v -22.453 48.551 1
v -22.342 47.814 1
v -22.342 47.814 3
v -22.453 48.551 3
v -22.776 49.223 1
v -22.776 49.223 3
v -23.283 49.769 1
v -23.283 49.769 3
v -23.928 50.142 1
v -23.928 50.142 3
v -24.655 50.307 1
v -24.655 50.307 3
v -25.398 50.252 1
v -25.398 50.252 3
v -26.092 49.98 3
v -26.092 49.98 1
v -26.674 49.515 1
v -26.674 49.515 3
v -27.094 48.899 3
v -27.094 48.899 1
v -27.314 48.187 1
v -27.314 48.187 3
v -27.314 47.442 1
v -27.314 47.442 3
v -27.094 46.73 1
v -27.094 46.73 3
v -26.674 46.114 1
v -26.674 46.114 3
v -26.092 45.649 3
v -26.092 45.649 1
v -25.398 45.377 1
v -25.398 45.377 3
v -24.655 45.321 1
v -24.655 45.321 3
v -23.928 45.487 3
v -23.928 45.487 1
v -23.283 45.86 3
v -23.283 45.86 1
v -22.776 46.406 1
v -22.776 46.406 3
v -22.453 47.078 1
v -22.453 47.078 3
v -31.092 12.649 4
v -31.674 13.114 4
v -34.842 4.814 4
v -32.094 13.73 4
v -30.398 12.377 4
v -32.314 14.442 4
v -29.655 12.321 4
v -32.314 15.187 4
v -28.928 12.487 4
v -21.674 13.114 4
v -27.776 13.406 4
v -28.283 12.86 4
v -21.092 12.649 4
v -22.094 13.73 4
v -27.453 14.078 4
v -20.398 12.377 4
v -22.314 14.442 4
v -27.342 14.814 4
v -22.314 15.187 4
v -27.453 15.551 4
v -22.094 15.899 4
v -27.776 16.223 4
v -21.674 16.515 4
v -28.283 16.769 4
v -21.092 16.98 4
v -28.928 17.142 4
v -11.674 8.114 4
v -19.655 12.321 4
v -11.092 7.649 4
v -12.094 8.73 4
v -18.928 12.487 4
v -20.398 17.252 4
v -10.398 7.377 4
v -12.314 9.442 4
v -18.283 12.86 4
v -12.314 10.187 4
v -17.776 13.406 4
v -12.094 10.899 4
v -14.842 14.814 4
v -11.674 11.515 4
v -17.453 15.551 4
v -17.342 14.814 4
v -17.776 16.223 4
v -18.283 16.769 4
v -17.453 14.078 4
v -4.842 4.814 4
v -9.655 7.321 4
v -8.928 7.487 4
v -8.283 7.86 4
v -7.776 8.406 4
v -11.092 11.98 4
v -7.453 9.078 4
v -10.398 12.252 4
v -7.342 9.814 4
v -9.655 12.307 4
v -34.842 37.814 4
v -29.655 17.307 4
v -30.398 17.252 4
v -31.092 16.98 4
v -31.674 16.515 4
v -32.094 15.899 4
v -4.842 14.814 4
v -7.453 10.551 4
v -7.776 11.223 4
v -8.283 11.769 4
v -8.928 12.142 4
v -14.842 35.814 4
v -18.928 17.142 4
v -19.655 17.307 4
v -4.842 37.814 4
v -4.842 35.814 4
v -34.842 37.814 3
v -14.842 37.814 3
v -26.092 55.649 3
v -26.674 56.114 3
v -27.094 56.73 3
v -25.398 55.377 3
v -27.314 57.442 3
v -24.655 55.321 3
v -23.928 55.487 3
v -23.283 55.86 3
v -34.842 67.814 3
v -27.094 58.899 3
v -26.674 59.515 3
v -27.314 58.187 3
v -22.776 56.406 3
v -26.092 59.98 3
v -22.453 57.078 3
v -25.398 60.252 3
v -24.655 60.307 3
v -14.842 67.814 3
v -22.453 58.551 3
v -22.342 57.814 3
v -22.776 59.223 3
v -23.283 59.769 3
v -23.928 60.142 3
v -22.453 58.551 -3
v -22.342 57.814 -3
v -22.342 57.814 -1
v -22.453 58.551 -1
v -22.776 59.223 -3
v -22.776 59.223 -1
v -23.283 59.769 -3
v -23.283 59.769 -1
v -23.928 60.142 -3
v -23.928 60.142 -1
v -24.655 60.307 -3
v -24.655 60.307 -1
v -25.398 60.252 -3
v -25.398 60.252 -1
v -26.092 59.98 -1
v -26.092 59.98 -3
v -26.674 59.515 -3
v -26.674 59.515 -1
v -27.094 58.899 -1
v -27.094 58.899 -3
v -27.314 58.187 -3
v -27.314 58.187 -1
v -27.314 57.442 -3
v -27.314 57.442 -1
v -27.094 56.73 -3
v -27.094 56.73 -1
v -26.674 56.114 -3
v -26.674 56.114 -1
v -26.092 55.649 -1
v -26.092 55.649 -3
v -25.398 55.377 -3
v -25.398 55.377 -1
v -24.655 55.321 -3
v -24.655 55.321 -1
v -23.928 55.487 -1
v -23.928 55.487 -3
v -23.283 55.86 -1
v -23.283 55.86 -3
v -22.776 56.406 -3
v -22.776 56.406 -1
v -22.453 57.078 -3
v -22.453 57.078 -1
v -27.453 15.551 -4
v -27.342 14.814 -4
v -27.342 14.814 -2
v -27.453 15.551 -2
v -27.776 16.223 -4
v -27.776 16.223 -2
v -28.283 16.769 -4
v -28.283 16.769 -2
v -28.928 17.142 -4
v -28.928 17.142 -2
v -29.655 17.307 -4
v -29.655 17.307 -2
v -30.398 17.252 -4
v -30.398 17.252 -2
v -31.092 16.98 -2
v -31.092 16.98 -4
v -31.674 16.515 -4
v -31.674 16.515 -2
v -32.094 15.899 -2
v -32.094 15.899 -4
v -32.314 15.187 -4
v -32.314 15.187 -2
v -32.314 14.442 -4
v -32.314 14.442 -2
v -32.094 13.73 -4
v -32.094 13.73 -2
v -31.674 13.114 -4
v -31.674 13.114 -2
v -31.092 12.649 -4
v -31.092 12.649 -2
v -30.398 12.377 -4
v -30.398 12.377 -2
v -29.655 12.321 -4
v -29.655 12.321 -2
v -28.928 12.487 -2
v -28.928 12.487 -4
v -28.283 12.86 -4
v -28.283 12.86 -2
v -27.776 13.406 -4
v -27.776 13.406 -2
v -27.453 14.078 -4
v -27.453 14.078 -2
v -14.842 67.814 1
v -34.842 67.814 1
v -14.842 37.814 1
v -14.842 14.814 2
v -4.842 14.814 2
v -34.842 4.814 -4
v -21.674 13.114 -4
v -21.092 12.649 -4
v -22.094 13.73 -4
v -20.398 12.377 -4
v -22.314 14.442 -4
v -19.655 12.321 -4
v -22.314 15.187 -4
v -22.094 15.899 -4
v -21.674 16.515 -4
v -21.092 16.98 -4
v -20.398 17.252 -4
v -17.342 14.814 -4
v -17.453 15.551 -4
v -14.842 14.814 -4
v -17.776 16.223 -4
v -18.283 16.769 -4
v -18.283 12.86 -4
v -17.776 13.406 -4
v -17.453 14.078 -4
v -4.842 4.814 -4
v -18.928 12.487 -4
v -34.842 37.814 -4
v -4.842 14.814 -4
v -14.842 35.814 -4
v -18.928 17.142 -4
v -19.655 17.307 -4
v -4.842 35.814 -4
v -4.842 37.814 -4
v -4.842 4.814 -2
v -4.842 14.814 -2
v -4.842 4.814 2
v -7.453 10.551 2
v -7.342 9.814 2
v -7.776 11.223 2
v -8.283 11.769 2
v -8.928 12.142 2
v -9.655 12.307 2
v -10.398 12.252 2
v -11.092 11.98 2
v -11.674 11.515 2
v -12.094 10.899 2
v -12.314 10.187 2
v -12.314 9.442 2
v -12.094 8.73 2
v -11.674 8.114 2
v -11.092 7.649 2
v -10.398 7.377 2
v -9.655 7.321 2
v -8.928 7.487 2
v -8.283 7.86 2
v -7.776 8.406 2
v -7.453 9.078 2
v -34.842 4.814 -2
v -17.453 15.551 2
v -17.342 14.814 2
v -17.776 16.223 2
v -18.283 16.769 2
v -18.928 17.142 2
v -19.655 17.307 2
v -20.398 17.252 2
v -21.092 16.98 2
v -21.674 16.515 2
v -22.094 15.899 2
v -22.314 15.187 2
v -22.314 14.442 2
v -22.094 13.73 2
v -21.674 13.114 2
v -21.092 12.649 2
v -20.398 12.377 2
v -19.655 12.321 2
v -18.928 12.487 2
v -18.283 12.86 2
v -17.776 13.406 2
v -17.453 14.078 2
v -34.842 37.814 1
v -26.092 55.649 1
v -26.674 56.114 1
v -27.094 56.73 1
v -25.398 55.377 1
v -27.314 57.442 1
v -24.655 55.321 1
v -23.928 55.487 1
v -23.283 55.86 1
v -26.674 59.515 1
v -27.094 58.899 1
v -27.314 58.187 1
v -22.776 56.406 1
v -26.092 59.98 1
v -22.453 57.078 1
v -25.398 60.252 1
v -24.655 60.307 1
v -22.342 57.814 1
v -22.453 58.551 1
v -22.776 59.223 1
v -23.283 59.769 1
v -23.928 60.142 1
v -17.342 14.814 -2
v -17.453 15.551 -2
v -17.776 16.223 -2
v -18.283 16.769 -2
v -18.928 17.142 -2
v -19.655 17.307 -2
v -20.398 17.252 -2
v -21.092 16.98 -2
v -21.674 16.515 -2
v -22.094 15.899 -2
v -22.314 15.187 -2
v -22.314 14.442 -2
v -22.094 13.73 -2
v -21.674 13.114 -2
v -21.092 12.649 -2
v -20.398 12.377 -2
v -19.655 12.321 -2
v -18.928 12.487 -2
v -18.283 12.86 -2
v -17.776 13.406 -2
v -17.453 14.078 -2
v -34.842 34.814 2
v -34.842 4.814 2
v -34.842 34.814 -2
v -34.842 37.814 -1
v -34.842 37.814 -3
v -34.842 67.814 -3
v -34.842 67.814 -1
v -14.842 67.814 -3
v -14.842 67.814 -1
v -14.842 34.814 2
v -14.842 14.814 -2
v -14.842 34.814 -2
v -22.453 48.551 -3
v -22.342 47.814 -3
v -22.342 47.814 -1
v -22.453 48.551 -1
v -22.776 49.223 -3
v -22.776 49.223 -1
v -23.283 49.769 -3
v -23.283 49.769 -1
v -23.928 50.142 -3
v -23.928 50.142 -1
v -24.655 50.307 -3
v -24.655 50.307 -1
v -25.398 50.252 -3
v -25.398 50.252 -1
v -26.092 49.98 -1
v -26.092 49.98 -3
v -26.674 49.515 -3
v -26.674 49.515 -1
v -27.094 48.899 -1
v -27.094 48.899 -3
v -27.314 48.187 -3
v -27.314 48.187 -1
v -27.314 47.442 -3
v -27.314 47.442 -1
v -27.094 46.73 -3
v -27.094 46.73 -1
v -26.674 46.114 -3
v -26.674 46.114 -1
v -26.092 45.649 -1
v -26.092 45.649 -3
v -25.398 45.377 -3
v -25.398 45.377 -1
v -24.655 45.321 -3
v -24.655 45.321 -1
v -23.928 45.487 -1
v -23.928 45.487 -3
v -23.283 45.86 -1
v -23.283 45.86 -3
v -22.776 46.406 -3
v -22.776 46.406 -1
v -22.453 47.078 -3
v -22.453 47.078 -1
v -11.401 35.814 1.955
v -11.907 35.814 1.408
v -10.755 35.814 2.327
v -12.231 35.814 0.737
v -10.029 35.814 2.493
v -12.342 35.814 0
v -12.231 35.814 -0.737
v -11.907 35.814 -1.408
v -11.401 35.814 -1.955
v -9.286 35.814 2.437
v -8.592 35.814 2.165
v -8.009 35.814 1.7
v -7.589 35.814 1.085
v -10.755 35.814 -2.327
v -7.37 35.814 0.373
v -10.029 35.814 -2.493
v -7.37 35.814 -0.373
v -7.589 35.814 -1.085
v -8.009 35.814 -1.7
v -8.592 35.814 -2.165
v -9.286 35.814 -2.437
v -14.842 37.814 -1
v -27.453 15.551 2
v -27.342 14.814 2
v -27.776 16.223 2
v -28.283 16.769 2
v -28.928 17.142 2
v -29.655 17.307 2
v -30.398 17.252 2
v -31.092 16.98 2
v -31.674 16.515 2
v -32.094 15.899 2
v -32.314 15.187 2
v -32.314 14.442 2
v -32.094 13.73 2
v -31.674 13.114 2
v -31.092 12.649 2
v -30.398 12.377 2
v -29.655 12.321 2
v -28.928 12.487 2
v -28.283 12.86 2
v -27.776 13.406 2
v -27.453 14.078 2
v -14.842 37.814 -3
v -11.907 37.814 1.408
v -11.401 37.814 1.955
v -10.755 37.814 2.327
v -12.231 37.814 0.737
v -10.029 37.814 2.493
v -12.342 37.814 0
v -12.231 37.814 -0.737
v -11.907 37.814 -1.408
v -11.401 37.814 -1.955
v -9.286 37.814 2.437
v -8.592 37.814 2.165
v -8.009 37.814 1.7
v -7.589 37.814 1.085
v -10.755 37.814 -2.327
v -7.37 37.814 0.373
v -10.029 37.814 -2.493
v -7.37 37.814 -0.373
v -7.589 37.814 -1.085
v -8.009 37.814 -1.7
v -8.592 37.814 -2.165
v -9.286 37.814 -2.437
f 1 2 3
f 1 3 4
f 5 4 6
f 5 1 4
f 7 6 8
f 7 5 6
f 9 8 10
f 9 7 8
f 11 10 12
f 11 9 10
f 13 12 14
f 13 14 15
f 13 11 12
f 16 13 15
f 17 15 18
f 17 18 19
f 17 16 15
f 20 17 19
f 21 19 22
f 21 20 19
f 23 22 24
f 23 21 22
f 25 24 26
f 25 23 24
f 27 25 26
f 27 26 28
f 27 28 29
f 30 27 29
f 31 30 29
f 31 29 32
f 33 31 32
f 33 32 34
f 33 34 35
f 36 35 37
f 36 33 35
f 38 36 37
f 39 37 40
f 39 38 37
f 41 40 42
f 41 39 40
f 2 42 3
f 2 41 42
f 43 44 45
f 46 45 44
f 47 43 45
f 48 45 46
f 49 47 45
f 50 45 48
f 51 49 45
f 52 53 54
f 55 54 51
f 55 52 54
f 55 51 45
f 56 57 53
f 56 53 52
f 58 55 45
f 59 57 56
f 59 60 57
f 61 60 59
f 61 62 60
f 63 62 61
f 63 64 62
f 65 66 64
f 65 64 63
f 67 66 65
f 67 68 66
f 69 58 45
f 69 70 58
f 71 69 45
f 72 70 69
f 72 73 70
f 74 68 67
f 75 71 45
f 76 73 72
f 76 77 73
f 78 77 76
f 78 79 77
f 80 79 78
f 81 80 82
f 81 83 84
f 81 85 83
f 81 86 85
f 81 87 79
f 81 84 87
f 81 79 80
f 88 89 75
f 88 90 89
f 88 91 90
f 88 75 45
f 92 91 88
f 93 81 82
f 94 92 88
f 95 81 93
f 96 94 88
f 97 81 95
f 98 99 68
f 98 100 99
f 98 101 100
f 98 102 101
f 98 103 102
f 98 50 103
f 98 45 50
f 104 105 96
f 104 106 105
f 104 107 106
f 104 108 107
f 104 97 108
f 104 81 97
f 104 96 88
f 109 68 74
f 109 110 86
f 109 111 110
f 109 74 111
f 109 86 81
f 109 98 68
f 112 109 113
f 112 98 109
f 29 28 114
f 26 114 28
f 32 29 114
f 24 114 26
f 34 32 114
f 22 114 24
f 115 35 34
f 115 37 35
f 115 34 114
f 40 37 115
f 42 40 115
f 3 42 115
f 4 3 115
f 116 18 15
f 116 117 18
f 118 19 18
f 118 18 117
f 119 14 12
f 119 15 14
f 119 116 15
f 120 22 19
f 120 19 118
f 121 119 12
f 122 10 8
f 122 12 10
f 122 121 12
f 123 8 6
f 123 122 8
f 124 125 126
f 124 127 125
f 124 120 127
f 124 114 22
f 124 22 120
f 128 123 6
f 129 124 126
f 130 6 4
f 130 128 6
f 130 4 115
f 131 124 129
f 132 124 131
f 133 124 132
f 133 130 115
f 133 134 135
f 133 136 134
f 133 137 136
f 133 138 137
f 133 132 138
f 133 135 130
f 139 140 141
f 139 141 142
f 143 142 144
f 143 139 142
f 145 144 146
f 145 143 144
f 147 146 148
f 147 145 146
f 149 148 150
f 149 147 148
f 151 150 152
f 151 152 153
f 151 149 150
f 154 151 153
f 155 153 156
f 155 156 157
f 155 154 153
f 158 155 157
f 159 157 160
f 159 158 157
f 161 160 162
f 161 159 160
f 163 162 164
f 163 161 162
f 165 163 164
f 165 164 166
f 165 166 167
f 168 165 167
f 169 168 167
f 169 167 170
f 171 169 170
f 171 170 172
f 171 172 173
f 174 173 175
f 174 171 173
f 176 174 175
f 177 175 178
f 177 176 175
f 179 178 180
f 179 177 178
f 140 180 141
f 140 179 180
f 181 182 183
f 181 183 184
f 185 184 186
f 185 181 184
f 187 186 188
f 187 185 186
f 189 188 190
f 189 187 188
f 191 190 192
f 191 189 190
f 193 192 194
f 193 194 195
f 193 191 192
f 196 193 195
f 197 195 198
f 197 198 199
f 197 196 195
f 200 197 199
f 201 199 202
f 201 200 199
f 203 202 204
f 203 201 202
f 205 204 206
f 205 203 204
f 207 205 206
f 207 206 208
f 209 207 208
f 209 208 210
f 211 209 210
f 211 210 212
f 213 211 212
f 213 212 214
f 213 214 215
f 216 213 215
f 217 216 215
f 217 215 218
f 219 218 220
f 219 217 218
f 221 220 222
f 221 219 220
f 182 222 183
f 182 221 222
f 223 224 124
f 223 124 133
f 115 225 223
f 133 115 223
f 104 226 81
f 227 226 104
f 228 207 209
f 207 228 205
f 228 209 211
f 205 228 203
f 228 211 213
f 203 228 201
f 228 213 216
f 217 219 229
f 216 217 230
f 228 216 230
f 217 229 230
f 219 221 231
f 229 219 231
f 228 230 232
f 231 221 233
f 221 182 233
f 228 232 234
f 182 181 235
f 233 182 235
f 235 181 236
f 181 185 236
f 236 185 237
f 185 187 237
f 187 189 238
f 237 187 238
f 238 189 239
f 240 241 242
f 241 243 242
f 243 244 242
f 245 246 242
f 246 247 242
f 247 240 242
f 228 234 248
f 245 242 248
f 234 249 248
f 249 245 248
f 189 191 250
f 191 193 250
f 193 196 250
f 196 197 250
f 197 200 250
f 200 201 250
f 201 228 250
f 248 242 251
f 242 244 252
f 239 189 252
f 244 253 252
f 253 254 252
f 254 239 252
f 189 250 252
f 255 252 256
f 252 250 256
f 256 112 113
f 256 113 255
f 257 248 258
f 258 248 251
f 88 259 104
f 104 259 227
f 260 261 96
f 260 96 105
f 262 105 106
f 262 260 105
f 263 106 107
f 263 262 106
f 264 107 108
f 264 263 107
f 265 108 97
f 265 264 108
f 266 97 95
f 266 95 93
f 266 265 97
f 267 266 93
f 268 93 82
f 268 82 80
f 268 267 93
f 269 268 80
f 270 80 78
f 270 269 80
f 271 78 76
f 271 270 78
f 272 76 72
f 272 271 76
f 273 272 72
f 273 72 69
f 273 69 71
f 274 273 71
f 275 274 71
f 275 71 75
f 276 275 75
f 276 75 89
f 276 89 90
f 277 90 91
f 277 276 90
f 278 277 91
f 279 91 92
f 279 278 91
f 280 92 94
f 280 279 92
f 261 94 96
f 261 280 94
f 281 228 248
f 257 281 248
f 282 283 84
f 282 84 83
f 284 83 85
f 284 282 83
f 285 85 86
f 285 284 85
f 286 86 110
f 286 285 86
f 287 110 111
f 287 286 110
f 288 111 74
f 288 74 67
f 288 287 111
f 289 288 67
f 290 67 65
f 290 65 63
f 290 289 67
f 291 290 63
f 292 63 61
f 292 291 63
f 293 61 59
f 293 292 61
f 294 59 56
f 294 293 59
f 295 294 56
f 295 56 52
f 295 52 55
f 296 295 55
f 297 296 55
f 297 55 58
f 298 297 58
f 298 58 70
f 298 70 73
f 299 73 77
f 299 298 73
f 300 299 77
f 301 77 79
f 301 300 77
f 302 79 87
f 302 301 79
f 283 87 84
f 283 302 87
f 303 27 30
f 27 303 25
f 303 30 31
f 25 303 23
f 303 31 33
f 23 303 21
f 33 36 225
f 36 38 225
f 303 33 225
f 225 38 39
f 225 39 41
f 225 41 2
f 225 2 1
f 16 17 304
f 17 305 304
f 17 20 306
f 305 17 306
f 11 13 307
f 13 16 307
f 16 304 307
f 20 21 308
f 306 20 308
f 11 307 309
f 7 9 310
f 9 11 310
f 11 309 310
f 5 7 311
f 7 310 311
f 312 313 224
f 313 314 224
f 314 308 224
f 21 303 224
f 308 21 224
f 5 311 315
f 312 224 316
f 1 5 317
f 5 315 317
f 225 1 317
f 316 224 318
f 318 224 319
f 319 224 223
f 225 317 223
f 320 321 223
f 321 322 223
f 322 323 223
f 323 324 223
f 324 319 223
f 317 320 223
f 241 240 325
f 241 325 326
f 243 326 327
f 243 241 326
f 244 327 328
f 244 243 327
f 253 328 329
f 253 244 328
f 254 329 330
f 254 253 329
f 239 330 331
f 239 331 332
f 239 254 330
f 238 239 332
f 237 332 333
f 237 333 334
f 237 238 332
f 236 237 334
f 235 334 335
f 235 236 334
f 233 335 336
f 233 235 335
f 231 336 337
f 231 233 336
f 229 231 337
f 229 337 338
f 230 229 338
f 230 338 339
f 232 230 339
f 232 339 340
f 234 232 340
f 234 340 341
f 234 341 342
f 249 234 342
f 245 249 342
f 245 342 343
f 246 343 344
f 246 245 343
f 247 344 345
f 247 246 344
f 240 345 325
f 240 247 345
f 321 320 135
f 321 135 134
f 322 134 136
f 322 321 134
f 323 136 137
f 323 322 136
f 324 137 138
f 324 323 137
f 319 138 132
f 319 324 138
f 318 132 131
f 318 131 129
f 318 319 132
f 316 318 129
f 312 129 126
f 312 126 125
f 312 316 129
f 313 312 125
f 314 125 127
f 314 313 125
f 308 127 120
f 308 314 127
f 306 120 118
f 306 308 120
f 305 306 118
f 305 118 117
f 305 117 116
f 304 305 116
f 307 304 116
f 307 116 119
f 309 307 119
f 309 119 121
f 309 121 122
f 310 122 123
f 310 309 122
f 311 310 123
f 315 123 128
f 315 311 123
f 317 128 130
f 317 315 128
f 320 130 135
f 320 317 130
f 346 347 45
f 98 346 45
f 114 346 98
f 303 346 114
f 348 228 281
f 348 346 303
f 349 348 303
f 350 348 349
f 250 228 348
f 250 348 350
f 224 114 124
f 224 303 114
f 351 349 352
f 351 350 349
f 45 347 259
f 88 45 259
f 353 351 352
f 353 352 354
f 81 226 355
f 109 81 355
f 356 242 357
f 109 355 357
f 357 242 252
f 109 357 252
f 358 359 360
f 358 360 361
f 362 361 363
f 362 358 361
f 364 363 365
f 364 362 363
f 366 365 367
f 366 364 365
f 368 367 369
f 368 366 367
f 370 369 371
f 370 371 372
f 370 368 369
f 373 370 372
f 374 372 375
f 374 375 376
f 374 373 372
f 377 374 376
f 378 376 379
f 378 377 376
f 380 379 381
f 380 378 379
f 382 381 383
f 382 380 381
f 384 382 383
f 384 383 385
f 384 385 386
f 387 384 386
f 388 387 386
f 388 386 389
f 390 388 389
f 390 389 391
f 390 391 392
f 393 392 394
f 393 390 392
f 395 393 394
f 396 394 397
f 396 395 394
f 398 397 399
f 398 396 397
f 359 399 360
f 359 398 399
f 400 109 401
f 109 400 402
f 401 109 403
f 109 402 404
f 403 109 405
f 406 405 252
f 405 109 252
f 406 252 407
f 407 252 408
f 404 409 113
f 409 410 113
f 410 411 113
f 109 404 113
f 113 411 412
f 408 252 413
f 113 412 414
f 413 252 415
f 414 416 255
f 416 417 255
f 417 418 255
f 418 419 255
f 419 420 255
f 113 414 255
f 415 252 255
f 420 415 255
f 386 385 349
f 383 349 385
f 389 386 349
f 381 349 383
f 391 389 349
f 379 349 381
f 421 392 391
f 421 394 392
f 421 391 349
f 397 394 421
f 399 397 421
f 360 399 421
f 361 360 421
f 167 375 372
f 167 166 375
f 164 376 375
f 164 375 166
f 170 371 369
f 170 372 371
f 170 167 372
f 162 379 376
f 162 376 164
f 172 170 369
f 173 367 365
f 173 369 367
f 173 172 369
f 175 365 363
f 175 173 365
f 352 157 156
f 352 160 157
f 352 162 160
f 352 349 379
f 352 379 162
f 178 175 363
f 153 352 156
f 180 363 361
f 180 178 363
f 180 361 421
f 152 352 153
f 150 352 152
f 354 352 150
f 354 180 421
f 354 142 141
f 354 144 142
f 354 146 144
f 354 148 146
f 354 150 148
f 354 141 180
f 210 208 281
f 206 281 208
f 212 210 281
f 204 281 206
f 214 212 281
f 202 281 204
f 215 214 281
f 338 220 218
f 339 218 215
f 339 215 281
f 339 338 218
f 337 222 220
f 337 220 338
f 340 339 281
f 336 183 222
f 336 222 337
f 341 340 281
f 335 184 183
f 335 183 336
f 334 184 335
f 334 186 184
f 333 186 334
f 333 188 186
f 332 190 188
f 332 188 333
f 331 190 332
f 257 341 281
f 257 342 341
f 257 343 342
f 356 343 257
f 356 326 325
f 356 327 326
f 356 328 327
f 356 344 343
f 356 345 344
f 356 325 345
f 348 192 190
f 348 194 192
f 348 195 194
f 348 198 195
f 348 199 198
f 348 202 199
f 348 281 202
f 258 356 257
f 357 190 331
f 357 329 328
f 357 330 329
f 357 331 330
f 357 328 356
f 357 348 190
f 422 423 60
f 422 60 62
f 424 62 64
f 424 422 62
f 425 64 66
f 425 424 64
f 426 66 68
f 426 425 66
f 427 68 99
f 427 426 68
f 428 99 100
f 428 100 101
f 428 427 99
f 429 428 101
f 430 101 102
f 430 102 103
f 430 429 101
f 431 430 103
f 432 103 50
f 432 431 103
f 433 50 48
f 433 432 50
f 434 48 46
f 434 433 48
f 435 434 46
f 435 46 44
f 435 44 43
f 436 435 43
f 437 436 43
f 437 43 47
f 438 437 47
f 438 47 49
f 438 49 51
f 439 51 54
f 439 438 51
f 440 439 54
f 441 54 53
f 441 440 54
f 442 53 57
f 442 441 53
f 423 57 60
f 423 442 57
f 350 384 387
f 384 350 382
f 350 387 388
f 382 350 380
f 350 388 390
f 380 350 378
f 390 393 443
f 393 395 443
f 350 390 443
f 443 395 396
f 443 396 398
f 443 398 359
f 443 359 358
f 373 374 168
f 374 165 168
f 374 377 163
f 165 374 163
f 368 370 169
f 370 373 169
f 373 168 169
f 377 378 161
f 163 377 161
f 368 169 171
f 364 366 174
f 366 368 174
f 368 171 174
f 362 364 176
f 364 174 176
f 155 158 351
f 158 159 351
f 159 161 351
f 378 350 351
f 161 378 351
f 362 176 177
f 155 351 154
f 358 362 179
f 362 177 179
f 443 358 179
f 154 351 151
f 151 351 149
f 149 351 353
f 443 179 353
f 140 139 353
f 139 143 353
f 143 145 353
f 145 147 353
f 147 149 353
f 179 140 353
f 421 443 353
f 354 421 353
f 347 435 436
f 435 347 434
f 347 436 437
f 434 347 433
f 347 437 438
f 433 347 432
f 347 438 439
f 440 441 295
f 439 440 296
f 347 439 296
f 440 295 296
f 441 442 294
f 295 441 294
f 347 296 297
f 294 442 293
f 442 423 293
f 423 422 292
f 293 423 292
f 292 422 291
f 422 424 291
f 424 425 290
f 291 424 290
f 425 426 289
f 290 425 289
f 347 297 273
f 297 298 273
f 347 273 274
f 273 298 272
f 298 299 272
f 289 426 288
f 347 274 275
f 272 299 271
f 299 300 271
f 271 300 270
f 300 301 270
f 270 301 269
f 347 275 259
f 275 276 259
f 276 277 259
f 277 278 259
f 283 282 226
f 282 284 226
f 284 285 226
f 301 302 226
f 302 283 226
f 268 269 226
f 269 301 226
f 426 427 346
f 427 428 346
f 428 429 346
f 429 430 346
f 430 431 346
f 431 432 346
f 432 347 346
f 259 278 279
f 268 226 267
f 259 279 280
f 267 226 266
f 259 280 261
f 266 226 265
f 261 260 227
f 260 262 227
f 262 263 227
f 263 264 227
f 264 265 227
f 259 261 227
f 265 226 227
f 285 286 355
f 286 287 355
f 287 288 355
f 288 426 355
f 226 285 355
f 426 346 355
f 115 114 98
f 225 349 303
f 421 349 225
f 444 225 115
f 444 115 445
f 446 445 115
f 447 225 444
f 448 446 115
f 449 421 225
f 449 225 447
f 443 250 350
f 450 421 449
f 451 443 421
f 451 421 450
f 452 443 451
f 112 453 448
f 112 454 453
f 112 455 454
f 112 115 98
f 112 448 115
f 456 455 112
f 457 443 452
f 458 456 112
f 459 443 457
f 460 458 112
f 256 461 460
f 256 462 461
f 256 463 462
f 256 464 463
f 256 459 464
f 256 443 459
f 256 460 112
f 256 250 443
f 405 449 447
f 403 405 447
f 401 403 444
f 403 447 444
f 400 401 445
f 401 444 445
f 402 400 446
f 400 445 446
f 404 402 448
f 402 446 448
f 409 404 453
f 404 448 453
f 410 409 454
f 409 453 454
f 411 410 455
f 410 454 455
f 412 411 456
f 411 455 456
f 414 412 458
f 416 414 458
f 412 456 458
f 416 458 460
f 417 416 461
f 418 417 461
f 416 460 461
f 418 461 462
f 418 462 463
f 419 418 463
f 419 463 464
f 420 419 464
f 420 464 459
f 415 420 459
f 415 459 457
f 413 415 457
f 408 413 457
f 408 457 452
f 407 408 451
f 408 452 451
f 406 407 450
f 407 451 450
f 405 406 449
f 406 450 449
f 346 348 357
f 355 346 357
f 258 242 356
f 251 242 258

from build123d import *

# Parameters (mm, degrees)
LIP_DEPTH       = 4
LIP_DEPTH_BACK  = 4
SKETCH1_W       = 20
SKETCH1_H       = 3
SIDE1_START     = 2
SKETCH1_3_R     = 2.5
SIDE1_DEPTH     = 2
SKETCH2_W       = 10
SKETCH2_H       = 8
SKETCH2_R       = 2.5
ZIP2_HOLE_DEPTH = 2
SIDE2_START     = -4
SKETCH1_4_R     = 2.5
SIDE2_DEPTH     = 2
GRABBER_START   = 1
SKETCH1_5_W     = 20
SKETCH1_5_H     = 30
SKETCH1_5_R     = 2.5
GRABBER_DEPTH   = 2
GRABBER_START_2 = -3
SKETCH1_6_W     = 20
SKETCH1_6_H     = 30
SKETCH1_6_R     = 2.5
GRABBER_2_DEPTH = 2


with BuildPart() as part:
    # Sketch1 → Lip (new, two sides: drawn at the far end of the back side and taken through both)
    with BuildSketch(Plane.XY.offset(-LIP_DEPTH_BACK)):
        with Locations((-24.8418229, 36.314477682)):
            Rectangle(SKETCH1_W, SKETCH1_H)
    extrude(amount=LIP_DEPTH + LIP_DEPTH_BACK)

    # Sketch1<3> → Side1 (add)
    with BuildSketch(Plane.XY.offset(SIDE1_START)):
        Polygon((-14.8418229, 34.814477682), (-34.8418229, 34.814477682), (-34.8418229, 4.814477682), (-4.8418229, 4.814477682), (-4.8418229, 14.814477682), (-14.8418229, 14.814477682), align=None)
        with Locations((-29.8418229, 14.814477682)):
            Circle(SKETCH1_3_R, mode=Mode.SUBTRACT)
        with Locations((-19.8418229, 14.814477682)):
            Circle(SKETCH1_3_R, mode=Mode.SUBTRACT)
        with Locations((-9.8418229, 9.814477682)):
            Circle(SKETCH1_3_R, mode=Mode.SUBTRACT)
    extrude(amount=SIDE1_DEPTH)

    # Sketch2 → Zip2 Hole (add)
    with BuildSketch(Plane(origin=(0, 37.814477682, 0), x_dir=(1, 0, 0), z_dir=(0, 1, 0))):
        with Locations((-9.8418229, 0)):
            Rectangle(SKETCH2_W, SKETCH2_H)
        with Locations((-9.8418229, 0)):
            Circle(SKETCH2_R, mode=Mode.SUBTRACT)
    extrude(amount=-ZIP2_HOLE_DEPTH)

    # Sketch1<4> → Side2 (add)
    with BuildSketch(Plane.XY.offset(SIDE2_START)):
        Polygon((-14.8418229, 34.814477682), (-34.8418229, 34.814477682), (-34.8418229, 4.814477682), (-4.8418229, 4.814477682), (-4.8418229, 14.814477682), (-14.8418229, 14.814477682), align=None)
        with Locations((-29.8418229, 14.814477682)):
            Circle(SKETCH1_4_R, mode=Mode.SUBTRACT)
        with Locations((-19.8418229, 14.814477682)):
            Circle(SKETCH1_4_R, mode=Mode.SUBTRACT)
    extrude(amount=SIDE2_DEPTH)

    # Sketch1<5> → Grabber (add)
    with BuildSketch(Plane.XY.offset(GRABBER_START)):
        with Locations((-24.8418229, 52.814477682)):
            Rectangle(SKETCH1_5_W, SKETCH1_5_H)
        with Locations((-24.8418229, 47.814477682)):
            Circle(SKETCH1_5_R, mode=Mode.SUBTRACT)
        with Locations((-24.8418229, 57.814477682)):
            Circle(SKETCH1_5_R, mode=Mode.SUBTRACT)
    extrude(amount=GRABBER_DEPTH)

    # Sketch1<6> → Grabber 2 (add)
    with BuildSketch(Plane.XY.offset(GRABBER_START_2)):
        with Locations((-24.8418229, 52.814477682)):
            Rectangle(SKETCH1_6_W, SKETCH1_6_H)
        with Locations((-24.8418229, 47.814477682)):
            Circle(SKETCH1_6_R, mode=Mode.SUBTRACT)
        with Locations((-24.8418229, 57.814477682)):
            Circle(SKETCH1_6_R, mode=Mode.SUBTRACT)
    extrude(amount=GRABBER_2_DEPTH)


solid = part.part
